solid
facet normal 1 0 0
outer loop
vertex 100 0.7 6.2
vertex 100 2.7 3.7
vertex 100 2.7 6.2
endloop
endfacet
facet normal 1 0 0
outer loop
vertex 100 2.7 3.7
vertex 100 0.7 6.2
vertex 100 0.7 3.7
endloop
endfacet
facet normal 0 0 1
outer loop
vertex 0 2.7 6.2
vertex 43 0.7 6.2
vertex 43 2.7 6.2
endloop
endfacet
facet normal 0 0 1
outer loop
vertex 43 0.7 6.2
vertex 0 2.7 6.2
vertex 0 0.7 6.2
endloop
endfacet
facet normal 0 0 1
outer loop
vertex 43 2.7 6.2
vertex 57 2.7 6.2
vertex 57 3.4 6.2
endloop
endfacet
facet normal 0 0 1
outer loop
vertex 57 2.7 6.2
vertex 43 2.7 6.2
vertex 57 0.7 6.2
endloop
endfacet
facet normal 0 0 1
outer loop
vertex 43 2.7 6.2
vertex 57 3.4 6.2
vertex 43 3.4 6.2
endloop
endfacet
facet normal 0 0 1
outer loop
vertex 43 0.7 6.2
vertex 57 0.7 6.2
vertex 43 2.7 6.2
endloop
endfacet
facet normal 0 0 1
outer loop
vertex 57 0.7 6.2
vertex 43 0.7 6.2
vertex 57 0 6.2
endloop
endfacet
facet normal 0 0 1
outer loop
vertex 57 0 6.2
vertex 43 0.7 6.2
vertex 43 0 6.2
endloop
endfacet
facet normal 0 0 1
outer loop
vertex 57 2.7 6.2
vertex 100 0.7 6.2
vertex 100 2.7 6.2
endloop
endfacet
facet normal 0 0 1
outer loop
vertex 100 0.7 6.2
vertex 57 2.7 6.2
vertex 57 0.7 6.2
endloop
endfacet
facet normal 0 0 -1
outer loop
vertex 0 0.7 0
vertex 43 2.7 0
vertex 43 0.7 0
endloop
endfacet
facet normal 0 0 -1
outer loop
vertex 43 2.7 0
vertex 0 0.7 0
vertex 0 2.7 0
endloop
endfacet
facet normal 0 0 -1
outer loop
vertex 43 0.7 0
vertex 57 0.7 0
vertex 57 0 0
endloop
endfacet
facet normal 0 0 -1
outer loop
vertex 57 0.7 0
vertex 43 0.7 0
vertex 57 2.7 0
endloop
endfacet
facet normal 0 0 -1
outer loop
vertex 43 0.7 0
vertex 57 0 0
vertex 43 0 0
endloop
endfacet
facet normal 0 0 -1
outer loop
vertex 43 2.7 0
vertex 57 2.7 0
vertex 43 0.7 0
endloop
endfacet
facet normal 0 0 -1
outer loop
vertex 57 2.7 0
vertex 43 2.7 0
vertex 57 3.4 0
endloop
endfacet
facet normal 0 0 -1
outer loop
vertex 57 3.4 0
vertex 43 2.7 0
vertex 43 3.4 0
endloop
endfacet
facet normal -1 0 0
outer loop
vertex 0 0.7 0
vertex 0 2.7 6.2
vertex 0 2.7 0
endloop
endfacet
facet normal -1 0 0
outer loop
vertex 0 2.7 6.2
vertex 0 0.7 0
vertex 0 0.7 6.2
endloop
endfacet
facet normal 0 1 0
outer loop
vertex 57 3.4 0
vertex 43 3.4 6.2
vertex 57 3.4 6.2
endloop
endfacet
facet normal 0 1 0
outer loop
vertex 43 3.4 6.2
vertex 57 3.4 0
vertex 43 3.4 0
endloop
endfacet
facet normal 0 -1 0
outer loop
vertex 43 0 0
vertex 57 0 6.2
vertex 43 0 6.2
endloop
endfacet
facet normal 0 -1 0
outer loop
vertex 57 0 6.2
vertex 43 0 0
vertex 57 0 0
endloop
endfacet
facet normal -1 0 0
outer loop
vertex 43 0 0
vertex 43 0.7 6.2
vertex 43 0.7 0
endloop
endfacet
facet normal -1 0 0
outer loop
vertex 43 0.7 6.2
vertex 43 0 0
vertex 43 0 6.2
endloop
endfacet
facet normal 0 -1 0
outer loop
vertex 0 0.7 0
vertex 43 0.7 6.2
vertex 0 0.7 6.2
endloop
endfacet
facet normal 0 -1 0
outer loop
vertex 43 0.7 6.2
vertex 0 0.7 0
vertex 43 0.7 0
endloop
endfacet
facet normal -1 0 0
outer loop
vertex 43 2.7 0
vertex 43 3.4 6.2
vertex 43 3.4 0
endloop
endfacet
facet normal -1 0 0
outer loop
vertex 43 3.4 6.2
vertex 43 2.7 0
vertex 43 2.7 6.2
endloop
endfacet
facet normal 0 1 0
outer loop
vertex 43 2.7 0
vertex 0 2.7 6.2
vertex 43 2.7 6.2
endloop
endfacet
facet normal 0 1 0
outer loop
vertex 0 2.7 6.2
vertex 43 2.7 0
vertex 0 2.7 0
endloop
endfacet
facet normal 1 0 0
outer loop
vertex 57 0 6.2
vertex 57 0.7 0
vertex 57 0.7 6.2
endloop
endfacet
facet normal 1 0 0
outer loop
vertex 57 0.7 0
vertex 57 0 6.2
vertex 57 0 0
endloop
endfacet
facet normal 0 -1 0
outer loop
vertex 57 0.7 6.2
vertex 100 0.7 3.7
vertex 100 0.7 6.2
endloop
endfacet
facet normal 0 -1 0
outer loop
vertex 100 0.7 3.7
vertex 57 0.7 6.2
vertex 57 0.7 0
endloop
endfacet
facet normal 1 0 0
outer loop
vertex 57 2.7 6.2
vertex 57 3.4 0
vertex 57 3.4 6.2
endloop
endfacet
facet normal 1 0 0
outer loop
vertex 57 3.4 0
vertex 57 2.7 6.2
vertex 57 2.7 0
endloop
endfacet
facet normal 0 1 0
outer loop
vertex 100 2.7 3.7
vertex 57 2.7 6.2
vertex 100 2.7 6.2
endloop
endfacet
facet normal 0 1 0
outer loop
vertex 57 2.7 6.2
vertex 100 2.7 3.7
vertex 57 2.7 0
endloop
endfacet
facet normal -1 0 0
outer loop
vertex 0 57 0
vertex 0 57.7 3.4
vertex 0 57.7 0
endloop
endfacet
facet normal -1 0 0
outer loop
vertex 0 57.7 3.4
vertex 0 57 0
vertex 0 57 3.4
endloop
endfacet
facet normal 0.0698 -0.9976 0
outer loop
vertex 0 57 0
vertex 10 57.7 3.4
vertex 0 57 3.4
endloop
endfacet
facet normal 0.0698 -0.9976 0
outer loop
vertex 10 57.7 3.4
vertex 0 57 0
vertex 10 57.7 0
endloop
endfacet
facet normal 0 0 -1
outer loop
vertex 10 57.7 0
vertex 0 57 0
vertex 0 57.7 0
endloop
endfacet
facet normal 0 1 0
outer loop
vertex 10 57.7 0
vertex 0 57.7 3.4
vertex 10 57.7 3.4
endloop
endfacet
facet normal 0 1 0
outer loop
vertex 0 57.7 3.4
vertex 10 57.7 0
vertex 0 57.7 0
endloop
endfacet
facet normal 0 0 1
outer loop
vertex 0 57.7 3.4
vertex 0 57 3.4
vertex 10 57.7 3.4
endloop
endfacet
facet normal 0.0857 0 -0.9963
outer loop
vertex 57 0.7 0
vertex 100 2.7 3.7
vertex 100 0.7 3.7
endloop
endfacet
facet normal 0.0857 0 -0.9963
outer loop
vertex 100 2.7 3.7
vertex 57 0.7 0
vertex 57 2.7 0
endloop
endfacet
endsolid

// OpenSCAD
module triangle(l, w, h) {
    polyhedron(
        points=[[0,0,0], [l,0,0], [l,w,0], [0,w,0], [0,w,h], [l,w,h]],
        faces=[[0,1,2,3],[5,4,3,2],[0,4,5,1],[0,3,4],[5,2,1]]
    );
}


module base() {
    union() {
        difference() {
            cube([100,3.4,6.2],false);
            translate([0,0,0]) cube([43,0.7,6.2],false);
            translate([0,3.4-0.7,0]) cube([43,0.7,6.2],false);
            translate([100-43,0,0]) cube([43,0.7,6.2],false);
            translate([100-43,3.4-0.7,0]) cube([43,0.7,6.2],false);
        }
        #rotate([0,90,0]) translate([-3.4,100-43,0]) triangle(3.4,0.7,10);
    }
}

// difference() {
//     cube([11.3,3.3,6.2],false);
// }

difference() {
    base();
    // rotate([0,0,90]) translate([0,-43,0]) triangle(3.4,43,6.2-2.5);
    rotate([0,0,-90]) translate([-3.4,100-43,0]) triangle(3.4,43,6.2-2.5);
}
